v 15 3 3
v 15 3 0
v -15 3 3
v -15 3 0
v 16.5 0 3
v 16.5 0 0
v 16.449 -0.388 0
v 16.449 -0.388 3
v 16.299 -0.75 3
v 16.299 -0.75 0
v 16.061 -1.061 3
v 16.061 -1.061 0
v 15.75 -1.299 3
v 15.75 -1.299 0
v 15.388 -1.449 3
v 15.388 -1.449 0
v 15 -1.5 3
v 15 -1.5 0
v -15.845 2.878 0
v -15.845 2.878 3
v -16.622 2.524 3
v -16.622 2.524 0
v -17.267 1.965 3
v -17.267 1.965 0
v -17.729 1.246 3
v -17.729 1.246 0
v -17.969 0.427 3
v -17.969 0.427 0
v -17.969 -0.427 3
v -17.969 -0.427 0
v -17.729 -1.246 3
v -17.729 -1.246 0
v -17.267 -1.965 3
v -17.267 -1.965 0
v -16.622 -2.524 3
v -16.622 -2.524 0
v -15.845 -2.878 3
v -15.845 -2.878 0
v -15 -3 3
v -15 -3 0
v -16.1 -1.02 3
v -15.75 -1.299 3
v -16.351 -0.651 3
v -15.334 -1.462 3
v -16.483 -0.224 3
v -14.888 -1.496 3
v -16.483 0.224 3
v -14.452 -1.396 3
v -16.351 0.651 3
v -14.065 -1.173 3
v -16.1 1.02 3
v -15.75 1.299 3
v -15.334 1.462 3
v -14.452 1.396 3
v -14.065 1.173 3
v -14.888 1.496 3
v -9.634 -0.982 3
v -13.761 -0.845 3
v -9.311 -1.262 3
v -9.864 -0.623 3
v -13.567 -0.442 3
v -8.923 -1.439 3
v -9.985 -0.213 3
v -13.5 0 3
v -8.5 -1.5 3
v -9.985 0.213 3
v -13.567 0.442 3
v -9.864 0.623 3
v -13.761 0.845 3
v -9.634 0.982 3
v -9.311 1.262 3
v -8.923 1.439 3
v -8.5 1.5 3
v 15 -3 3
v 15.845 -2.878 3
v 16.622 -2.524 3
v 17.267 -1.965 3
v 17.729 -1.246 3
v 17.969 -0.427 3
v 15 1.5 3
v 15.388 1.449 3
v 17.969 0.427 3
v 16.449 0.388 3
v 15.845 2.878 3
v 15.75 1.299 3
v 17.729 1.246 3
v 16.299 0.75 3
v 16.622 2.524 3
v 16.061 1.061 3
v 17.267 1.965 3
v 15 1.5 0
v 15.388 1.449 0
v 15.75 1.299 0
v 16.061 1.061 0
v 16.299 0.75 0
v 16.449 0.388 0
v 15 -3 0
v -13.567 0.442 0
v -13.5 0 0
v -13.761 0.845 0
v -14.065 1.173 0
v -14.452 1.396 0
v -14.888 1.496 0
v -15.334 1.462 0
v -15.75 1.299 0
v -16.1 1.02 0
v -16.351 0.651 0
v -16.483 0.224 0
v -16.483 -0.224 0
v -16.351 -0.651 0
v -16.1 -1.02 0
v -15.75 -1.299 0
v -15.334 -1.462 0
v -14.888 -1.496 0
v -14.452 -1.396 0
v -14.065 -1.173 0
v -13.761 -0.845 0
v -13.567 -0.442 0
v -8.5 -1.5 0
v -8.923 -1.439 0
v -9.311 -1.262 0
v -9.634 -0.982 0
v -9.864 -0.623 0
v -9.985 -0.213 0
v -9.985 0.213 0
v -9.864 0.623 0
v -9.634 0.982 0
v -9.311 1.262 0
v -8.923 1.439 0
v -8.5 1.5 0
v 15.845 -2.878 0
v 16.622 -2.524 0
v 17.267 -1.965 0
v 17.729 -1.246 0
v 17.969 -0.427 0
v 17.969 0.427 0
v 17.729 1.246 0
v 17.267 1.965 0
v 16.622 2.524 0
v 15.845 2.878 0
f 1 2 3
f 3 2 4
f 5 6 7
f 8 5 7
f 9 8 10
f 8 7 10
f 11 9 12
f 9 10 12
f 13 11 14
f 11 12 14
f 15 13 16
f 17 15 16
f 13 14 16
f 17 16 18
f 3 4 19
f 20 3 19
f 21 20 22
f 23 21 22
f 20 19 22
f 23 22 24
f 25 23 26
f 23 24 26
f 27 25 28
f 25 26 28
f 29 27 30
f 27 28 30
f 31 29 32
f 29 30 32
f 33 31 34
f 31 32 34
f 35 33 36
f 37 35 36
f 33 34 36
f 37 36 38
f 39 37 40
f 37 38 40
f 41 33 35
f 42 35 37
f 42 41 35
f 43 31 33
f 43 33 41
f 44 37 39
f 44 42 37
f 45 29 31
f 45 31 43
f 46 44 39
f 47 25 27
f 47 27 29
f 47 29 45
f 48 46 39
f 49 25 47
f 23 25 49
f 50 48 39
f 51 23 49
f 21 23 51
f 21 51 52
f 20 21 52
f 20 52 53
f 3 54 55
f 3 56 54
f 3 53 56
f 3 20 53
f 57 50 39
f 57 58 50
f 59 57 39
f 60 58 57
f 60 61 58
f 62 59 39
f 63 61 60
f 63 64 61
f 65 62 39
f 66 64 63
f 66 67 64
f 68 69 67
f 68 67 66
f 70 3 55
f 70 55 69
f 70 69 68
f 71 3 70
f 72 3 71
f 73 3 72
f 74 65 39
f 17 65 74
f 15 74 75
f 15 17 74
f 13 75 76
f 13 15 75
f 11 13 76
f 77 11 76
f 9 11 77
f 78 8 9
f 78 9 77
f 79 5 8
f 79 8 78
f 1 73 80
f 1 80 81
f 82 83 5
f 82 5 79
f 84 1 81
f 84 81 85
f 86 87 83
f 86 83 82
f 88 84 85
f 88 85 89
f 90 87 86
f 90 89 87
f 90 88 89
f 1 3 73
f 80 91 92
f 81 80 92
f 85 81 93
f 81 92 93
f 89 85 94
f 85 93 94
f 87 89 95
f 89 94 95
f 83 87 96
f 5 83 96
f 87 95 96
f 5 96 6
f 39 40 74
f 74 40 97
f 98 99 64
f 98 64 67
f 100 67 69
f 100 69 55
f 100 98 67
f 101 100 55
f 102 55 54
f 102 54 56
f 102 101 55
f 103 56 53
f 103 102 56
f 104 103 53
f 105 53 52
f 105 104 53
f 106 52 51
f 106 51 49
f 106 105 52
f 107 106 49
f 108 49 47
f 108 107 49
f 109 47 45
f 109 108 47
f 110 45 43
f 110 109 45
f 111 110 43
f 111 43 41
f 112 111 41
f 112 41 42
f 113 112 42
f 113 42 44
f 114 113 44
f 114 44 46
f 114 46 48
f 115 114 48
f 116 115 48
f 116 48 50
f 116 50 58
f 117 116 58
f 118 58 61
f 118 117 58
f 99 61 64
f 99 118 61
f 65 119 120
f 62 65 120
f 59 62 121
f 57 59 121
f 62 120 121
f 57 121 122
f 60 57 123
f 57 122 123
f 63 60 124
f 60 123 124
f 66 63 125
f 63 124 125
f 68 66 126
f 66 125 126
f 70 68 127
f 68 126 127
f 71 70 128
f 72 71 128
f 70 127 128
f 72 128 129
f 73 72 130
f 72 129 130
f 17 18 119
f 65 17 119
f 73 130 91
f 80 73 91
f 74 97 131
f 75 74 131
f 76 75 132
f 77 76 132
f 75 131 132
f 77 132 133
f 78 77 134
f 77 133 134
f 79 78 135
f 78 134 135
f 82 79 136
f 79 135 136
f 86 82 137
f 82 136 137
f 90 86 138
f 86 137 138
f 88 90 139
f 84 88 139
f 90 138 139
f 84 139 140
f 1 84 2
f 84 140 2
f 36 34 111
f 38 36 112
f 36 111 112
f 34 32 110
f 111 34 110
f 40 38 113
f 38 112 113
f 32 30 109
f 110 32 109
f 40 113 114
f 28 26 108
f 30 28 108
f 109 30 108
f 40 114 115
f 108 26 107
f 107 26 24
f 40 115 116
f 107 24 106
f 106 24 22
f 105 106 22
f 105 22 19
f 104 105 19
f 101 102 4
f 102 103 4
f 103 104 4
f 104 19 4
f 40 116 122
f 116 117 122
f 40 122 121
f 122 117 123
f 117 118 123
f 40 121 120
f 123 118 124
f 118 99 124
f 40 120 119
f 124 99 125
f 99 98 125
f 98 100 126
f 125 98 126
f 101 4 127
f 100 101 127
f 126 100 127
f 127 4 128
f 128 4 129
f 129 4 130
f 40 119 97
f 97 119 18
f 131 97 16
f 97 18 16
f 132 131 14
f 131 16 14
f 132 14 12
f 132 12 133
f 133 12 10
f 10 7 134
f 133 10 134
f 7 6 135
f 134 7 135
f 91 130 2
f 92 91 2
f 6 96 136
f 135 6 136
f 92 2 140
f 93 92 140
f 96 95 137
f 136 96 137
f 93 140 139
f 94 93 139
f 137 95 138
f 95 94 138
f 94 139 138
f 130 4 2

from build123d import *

# Parameters (mm, degrees)
F0_R     = 1.5
F1_DEPTH = 3


with BuildPart() as f1:
    # F0 (on Top) → F1 (new body)
    with BuildSketch(Plane.XY):
        with BuildLine():
            Line((15, 3), (0, 3))
            Line((0, 3), (-15, 3))
            ThreePointArc((-15, 3), (-12.87868, 2.12132), (-12, 0))
            ThreePointArc((-12, 0), (-12.87868, -2.12132), (-15, -3))
            Line((-15, -3), (0, -3))
            Line((0, -3), (15, -3))
            ThreePointArc((15, -3), (18, 0), (15, 3))
        make_face()
        with BuildLine():
            ThreePointArc((-8.5, -1.5), (-10, 0), (-8.5, 1.5))
            Line((-8.5, 1.5), (15, 1.5))
            ThreePointArc((15, 1.5), (16.06066, 1.06066), (16.5, 0))
            ThreePointArc((16.5, 0), (16.06066, -1.06066), (15, -1.5))
            Line((15, -1.5), (-8.5, -1.5))
        make_face(mode=Mode.SUBTRACT)
        with BuildLine():
            ThreePointArc((-12, 0), (-12.87868, 2.12132), (-15, 3))
            ThreePointArc((-15, 3), (-18, 0), (-15, -3))
            ThreePointArc((-15, -3), (-12.87868, -2.12132), (-12, 0))
        make_face()
        with Locations((-15, 0)):
            Circle(F0_R, mode=Mode.SUBTRACT)
    extrude(amount=F1_DEPTH)


solid = f1.part
